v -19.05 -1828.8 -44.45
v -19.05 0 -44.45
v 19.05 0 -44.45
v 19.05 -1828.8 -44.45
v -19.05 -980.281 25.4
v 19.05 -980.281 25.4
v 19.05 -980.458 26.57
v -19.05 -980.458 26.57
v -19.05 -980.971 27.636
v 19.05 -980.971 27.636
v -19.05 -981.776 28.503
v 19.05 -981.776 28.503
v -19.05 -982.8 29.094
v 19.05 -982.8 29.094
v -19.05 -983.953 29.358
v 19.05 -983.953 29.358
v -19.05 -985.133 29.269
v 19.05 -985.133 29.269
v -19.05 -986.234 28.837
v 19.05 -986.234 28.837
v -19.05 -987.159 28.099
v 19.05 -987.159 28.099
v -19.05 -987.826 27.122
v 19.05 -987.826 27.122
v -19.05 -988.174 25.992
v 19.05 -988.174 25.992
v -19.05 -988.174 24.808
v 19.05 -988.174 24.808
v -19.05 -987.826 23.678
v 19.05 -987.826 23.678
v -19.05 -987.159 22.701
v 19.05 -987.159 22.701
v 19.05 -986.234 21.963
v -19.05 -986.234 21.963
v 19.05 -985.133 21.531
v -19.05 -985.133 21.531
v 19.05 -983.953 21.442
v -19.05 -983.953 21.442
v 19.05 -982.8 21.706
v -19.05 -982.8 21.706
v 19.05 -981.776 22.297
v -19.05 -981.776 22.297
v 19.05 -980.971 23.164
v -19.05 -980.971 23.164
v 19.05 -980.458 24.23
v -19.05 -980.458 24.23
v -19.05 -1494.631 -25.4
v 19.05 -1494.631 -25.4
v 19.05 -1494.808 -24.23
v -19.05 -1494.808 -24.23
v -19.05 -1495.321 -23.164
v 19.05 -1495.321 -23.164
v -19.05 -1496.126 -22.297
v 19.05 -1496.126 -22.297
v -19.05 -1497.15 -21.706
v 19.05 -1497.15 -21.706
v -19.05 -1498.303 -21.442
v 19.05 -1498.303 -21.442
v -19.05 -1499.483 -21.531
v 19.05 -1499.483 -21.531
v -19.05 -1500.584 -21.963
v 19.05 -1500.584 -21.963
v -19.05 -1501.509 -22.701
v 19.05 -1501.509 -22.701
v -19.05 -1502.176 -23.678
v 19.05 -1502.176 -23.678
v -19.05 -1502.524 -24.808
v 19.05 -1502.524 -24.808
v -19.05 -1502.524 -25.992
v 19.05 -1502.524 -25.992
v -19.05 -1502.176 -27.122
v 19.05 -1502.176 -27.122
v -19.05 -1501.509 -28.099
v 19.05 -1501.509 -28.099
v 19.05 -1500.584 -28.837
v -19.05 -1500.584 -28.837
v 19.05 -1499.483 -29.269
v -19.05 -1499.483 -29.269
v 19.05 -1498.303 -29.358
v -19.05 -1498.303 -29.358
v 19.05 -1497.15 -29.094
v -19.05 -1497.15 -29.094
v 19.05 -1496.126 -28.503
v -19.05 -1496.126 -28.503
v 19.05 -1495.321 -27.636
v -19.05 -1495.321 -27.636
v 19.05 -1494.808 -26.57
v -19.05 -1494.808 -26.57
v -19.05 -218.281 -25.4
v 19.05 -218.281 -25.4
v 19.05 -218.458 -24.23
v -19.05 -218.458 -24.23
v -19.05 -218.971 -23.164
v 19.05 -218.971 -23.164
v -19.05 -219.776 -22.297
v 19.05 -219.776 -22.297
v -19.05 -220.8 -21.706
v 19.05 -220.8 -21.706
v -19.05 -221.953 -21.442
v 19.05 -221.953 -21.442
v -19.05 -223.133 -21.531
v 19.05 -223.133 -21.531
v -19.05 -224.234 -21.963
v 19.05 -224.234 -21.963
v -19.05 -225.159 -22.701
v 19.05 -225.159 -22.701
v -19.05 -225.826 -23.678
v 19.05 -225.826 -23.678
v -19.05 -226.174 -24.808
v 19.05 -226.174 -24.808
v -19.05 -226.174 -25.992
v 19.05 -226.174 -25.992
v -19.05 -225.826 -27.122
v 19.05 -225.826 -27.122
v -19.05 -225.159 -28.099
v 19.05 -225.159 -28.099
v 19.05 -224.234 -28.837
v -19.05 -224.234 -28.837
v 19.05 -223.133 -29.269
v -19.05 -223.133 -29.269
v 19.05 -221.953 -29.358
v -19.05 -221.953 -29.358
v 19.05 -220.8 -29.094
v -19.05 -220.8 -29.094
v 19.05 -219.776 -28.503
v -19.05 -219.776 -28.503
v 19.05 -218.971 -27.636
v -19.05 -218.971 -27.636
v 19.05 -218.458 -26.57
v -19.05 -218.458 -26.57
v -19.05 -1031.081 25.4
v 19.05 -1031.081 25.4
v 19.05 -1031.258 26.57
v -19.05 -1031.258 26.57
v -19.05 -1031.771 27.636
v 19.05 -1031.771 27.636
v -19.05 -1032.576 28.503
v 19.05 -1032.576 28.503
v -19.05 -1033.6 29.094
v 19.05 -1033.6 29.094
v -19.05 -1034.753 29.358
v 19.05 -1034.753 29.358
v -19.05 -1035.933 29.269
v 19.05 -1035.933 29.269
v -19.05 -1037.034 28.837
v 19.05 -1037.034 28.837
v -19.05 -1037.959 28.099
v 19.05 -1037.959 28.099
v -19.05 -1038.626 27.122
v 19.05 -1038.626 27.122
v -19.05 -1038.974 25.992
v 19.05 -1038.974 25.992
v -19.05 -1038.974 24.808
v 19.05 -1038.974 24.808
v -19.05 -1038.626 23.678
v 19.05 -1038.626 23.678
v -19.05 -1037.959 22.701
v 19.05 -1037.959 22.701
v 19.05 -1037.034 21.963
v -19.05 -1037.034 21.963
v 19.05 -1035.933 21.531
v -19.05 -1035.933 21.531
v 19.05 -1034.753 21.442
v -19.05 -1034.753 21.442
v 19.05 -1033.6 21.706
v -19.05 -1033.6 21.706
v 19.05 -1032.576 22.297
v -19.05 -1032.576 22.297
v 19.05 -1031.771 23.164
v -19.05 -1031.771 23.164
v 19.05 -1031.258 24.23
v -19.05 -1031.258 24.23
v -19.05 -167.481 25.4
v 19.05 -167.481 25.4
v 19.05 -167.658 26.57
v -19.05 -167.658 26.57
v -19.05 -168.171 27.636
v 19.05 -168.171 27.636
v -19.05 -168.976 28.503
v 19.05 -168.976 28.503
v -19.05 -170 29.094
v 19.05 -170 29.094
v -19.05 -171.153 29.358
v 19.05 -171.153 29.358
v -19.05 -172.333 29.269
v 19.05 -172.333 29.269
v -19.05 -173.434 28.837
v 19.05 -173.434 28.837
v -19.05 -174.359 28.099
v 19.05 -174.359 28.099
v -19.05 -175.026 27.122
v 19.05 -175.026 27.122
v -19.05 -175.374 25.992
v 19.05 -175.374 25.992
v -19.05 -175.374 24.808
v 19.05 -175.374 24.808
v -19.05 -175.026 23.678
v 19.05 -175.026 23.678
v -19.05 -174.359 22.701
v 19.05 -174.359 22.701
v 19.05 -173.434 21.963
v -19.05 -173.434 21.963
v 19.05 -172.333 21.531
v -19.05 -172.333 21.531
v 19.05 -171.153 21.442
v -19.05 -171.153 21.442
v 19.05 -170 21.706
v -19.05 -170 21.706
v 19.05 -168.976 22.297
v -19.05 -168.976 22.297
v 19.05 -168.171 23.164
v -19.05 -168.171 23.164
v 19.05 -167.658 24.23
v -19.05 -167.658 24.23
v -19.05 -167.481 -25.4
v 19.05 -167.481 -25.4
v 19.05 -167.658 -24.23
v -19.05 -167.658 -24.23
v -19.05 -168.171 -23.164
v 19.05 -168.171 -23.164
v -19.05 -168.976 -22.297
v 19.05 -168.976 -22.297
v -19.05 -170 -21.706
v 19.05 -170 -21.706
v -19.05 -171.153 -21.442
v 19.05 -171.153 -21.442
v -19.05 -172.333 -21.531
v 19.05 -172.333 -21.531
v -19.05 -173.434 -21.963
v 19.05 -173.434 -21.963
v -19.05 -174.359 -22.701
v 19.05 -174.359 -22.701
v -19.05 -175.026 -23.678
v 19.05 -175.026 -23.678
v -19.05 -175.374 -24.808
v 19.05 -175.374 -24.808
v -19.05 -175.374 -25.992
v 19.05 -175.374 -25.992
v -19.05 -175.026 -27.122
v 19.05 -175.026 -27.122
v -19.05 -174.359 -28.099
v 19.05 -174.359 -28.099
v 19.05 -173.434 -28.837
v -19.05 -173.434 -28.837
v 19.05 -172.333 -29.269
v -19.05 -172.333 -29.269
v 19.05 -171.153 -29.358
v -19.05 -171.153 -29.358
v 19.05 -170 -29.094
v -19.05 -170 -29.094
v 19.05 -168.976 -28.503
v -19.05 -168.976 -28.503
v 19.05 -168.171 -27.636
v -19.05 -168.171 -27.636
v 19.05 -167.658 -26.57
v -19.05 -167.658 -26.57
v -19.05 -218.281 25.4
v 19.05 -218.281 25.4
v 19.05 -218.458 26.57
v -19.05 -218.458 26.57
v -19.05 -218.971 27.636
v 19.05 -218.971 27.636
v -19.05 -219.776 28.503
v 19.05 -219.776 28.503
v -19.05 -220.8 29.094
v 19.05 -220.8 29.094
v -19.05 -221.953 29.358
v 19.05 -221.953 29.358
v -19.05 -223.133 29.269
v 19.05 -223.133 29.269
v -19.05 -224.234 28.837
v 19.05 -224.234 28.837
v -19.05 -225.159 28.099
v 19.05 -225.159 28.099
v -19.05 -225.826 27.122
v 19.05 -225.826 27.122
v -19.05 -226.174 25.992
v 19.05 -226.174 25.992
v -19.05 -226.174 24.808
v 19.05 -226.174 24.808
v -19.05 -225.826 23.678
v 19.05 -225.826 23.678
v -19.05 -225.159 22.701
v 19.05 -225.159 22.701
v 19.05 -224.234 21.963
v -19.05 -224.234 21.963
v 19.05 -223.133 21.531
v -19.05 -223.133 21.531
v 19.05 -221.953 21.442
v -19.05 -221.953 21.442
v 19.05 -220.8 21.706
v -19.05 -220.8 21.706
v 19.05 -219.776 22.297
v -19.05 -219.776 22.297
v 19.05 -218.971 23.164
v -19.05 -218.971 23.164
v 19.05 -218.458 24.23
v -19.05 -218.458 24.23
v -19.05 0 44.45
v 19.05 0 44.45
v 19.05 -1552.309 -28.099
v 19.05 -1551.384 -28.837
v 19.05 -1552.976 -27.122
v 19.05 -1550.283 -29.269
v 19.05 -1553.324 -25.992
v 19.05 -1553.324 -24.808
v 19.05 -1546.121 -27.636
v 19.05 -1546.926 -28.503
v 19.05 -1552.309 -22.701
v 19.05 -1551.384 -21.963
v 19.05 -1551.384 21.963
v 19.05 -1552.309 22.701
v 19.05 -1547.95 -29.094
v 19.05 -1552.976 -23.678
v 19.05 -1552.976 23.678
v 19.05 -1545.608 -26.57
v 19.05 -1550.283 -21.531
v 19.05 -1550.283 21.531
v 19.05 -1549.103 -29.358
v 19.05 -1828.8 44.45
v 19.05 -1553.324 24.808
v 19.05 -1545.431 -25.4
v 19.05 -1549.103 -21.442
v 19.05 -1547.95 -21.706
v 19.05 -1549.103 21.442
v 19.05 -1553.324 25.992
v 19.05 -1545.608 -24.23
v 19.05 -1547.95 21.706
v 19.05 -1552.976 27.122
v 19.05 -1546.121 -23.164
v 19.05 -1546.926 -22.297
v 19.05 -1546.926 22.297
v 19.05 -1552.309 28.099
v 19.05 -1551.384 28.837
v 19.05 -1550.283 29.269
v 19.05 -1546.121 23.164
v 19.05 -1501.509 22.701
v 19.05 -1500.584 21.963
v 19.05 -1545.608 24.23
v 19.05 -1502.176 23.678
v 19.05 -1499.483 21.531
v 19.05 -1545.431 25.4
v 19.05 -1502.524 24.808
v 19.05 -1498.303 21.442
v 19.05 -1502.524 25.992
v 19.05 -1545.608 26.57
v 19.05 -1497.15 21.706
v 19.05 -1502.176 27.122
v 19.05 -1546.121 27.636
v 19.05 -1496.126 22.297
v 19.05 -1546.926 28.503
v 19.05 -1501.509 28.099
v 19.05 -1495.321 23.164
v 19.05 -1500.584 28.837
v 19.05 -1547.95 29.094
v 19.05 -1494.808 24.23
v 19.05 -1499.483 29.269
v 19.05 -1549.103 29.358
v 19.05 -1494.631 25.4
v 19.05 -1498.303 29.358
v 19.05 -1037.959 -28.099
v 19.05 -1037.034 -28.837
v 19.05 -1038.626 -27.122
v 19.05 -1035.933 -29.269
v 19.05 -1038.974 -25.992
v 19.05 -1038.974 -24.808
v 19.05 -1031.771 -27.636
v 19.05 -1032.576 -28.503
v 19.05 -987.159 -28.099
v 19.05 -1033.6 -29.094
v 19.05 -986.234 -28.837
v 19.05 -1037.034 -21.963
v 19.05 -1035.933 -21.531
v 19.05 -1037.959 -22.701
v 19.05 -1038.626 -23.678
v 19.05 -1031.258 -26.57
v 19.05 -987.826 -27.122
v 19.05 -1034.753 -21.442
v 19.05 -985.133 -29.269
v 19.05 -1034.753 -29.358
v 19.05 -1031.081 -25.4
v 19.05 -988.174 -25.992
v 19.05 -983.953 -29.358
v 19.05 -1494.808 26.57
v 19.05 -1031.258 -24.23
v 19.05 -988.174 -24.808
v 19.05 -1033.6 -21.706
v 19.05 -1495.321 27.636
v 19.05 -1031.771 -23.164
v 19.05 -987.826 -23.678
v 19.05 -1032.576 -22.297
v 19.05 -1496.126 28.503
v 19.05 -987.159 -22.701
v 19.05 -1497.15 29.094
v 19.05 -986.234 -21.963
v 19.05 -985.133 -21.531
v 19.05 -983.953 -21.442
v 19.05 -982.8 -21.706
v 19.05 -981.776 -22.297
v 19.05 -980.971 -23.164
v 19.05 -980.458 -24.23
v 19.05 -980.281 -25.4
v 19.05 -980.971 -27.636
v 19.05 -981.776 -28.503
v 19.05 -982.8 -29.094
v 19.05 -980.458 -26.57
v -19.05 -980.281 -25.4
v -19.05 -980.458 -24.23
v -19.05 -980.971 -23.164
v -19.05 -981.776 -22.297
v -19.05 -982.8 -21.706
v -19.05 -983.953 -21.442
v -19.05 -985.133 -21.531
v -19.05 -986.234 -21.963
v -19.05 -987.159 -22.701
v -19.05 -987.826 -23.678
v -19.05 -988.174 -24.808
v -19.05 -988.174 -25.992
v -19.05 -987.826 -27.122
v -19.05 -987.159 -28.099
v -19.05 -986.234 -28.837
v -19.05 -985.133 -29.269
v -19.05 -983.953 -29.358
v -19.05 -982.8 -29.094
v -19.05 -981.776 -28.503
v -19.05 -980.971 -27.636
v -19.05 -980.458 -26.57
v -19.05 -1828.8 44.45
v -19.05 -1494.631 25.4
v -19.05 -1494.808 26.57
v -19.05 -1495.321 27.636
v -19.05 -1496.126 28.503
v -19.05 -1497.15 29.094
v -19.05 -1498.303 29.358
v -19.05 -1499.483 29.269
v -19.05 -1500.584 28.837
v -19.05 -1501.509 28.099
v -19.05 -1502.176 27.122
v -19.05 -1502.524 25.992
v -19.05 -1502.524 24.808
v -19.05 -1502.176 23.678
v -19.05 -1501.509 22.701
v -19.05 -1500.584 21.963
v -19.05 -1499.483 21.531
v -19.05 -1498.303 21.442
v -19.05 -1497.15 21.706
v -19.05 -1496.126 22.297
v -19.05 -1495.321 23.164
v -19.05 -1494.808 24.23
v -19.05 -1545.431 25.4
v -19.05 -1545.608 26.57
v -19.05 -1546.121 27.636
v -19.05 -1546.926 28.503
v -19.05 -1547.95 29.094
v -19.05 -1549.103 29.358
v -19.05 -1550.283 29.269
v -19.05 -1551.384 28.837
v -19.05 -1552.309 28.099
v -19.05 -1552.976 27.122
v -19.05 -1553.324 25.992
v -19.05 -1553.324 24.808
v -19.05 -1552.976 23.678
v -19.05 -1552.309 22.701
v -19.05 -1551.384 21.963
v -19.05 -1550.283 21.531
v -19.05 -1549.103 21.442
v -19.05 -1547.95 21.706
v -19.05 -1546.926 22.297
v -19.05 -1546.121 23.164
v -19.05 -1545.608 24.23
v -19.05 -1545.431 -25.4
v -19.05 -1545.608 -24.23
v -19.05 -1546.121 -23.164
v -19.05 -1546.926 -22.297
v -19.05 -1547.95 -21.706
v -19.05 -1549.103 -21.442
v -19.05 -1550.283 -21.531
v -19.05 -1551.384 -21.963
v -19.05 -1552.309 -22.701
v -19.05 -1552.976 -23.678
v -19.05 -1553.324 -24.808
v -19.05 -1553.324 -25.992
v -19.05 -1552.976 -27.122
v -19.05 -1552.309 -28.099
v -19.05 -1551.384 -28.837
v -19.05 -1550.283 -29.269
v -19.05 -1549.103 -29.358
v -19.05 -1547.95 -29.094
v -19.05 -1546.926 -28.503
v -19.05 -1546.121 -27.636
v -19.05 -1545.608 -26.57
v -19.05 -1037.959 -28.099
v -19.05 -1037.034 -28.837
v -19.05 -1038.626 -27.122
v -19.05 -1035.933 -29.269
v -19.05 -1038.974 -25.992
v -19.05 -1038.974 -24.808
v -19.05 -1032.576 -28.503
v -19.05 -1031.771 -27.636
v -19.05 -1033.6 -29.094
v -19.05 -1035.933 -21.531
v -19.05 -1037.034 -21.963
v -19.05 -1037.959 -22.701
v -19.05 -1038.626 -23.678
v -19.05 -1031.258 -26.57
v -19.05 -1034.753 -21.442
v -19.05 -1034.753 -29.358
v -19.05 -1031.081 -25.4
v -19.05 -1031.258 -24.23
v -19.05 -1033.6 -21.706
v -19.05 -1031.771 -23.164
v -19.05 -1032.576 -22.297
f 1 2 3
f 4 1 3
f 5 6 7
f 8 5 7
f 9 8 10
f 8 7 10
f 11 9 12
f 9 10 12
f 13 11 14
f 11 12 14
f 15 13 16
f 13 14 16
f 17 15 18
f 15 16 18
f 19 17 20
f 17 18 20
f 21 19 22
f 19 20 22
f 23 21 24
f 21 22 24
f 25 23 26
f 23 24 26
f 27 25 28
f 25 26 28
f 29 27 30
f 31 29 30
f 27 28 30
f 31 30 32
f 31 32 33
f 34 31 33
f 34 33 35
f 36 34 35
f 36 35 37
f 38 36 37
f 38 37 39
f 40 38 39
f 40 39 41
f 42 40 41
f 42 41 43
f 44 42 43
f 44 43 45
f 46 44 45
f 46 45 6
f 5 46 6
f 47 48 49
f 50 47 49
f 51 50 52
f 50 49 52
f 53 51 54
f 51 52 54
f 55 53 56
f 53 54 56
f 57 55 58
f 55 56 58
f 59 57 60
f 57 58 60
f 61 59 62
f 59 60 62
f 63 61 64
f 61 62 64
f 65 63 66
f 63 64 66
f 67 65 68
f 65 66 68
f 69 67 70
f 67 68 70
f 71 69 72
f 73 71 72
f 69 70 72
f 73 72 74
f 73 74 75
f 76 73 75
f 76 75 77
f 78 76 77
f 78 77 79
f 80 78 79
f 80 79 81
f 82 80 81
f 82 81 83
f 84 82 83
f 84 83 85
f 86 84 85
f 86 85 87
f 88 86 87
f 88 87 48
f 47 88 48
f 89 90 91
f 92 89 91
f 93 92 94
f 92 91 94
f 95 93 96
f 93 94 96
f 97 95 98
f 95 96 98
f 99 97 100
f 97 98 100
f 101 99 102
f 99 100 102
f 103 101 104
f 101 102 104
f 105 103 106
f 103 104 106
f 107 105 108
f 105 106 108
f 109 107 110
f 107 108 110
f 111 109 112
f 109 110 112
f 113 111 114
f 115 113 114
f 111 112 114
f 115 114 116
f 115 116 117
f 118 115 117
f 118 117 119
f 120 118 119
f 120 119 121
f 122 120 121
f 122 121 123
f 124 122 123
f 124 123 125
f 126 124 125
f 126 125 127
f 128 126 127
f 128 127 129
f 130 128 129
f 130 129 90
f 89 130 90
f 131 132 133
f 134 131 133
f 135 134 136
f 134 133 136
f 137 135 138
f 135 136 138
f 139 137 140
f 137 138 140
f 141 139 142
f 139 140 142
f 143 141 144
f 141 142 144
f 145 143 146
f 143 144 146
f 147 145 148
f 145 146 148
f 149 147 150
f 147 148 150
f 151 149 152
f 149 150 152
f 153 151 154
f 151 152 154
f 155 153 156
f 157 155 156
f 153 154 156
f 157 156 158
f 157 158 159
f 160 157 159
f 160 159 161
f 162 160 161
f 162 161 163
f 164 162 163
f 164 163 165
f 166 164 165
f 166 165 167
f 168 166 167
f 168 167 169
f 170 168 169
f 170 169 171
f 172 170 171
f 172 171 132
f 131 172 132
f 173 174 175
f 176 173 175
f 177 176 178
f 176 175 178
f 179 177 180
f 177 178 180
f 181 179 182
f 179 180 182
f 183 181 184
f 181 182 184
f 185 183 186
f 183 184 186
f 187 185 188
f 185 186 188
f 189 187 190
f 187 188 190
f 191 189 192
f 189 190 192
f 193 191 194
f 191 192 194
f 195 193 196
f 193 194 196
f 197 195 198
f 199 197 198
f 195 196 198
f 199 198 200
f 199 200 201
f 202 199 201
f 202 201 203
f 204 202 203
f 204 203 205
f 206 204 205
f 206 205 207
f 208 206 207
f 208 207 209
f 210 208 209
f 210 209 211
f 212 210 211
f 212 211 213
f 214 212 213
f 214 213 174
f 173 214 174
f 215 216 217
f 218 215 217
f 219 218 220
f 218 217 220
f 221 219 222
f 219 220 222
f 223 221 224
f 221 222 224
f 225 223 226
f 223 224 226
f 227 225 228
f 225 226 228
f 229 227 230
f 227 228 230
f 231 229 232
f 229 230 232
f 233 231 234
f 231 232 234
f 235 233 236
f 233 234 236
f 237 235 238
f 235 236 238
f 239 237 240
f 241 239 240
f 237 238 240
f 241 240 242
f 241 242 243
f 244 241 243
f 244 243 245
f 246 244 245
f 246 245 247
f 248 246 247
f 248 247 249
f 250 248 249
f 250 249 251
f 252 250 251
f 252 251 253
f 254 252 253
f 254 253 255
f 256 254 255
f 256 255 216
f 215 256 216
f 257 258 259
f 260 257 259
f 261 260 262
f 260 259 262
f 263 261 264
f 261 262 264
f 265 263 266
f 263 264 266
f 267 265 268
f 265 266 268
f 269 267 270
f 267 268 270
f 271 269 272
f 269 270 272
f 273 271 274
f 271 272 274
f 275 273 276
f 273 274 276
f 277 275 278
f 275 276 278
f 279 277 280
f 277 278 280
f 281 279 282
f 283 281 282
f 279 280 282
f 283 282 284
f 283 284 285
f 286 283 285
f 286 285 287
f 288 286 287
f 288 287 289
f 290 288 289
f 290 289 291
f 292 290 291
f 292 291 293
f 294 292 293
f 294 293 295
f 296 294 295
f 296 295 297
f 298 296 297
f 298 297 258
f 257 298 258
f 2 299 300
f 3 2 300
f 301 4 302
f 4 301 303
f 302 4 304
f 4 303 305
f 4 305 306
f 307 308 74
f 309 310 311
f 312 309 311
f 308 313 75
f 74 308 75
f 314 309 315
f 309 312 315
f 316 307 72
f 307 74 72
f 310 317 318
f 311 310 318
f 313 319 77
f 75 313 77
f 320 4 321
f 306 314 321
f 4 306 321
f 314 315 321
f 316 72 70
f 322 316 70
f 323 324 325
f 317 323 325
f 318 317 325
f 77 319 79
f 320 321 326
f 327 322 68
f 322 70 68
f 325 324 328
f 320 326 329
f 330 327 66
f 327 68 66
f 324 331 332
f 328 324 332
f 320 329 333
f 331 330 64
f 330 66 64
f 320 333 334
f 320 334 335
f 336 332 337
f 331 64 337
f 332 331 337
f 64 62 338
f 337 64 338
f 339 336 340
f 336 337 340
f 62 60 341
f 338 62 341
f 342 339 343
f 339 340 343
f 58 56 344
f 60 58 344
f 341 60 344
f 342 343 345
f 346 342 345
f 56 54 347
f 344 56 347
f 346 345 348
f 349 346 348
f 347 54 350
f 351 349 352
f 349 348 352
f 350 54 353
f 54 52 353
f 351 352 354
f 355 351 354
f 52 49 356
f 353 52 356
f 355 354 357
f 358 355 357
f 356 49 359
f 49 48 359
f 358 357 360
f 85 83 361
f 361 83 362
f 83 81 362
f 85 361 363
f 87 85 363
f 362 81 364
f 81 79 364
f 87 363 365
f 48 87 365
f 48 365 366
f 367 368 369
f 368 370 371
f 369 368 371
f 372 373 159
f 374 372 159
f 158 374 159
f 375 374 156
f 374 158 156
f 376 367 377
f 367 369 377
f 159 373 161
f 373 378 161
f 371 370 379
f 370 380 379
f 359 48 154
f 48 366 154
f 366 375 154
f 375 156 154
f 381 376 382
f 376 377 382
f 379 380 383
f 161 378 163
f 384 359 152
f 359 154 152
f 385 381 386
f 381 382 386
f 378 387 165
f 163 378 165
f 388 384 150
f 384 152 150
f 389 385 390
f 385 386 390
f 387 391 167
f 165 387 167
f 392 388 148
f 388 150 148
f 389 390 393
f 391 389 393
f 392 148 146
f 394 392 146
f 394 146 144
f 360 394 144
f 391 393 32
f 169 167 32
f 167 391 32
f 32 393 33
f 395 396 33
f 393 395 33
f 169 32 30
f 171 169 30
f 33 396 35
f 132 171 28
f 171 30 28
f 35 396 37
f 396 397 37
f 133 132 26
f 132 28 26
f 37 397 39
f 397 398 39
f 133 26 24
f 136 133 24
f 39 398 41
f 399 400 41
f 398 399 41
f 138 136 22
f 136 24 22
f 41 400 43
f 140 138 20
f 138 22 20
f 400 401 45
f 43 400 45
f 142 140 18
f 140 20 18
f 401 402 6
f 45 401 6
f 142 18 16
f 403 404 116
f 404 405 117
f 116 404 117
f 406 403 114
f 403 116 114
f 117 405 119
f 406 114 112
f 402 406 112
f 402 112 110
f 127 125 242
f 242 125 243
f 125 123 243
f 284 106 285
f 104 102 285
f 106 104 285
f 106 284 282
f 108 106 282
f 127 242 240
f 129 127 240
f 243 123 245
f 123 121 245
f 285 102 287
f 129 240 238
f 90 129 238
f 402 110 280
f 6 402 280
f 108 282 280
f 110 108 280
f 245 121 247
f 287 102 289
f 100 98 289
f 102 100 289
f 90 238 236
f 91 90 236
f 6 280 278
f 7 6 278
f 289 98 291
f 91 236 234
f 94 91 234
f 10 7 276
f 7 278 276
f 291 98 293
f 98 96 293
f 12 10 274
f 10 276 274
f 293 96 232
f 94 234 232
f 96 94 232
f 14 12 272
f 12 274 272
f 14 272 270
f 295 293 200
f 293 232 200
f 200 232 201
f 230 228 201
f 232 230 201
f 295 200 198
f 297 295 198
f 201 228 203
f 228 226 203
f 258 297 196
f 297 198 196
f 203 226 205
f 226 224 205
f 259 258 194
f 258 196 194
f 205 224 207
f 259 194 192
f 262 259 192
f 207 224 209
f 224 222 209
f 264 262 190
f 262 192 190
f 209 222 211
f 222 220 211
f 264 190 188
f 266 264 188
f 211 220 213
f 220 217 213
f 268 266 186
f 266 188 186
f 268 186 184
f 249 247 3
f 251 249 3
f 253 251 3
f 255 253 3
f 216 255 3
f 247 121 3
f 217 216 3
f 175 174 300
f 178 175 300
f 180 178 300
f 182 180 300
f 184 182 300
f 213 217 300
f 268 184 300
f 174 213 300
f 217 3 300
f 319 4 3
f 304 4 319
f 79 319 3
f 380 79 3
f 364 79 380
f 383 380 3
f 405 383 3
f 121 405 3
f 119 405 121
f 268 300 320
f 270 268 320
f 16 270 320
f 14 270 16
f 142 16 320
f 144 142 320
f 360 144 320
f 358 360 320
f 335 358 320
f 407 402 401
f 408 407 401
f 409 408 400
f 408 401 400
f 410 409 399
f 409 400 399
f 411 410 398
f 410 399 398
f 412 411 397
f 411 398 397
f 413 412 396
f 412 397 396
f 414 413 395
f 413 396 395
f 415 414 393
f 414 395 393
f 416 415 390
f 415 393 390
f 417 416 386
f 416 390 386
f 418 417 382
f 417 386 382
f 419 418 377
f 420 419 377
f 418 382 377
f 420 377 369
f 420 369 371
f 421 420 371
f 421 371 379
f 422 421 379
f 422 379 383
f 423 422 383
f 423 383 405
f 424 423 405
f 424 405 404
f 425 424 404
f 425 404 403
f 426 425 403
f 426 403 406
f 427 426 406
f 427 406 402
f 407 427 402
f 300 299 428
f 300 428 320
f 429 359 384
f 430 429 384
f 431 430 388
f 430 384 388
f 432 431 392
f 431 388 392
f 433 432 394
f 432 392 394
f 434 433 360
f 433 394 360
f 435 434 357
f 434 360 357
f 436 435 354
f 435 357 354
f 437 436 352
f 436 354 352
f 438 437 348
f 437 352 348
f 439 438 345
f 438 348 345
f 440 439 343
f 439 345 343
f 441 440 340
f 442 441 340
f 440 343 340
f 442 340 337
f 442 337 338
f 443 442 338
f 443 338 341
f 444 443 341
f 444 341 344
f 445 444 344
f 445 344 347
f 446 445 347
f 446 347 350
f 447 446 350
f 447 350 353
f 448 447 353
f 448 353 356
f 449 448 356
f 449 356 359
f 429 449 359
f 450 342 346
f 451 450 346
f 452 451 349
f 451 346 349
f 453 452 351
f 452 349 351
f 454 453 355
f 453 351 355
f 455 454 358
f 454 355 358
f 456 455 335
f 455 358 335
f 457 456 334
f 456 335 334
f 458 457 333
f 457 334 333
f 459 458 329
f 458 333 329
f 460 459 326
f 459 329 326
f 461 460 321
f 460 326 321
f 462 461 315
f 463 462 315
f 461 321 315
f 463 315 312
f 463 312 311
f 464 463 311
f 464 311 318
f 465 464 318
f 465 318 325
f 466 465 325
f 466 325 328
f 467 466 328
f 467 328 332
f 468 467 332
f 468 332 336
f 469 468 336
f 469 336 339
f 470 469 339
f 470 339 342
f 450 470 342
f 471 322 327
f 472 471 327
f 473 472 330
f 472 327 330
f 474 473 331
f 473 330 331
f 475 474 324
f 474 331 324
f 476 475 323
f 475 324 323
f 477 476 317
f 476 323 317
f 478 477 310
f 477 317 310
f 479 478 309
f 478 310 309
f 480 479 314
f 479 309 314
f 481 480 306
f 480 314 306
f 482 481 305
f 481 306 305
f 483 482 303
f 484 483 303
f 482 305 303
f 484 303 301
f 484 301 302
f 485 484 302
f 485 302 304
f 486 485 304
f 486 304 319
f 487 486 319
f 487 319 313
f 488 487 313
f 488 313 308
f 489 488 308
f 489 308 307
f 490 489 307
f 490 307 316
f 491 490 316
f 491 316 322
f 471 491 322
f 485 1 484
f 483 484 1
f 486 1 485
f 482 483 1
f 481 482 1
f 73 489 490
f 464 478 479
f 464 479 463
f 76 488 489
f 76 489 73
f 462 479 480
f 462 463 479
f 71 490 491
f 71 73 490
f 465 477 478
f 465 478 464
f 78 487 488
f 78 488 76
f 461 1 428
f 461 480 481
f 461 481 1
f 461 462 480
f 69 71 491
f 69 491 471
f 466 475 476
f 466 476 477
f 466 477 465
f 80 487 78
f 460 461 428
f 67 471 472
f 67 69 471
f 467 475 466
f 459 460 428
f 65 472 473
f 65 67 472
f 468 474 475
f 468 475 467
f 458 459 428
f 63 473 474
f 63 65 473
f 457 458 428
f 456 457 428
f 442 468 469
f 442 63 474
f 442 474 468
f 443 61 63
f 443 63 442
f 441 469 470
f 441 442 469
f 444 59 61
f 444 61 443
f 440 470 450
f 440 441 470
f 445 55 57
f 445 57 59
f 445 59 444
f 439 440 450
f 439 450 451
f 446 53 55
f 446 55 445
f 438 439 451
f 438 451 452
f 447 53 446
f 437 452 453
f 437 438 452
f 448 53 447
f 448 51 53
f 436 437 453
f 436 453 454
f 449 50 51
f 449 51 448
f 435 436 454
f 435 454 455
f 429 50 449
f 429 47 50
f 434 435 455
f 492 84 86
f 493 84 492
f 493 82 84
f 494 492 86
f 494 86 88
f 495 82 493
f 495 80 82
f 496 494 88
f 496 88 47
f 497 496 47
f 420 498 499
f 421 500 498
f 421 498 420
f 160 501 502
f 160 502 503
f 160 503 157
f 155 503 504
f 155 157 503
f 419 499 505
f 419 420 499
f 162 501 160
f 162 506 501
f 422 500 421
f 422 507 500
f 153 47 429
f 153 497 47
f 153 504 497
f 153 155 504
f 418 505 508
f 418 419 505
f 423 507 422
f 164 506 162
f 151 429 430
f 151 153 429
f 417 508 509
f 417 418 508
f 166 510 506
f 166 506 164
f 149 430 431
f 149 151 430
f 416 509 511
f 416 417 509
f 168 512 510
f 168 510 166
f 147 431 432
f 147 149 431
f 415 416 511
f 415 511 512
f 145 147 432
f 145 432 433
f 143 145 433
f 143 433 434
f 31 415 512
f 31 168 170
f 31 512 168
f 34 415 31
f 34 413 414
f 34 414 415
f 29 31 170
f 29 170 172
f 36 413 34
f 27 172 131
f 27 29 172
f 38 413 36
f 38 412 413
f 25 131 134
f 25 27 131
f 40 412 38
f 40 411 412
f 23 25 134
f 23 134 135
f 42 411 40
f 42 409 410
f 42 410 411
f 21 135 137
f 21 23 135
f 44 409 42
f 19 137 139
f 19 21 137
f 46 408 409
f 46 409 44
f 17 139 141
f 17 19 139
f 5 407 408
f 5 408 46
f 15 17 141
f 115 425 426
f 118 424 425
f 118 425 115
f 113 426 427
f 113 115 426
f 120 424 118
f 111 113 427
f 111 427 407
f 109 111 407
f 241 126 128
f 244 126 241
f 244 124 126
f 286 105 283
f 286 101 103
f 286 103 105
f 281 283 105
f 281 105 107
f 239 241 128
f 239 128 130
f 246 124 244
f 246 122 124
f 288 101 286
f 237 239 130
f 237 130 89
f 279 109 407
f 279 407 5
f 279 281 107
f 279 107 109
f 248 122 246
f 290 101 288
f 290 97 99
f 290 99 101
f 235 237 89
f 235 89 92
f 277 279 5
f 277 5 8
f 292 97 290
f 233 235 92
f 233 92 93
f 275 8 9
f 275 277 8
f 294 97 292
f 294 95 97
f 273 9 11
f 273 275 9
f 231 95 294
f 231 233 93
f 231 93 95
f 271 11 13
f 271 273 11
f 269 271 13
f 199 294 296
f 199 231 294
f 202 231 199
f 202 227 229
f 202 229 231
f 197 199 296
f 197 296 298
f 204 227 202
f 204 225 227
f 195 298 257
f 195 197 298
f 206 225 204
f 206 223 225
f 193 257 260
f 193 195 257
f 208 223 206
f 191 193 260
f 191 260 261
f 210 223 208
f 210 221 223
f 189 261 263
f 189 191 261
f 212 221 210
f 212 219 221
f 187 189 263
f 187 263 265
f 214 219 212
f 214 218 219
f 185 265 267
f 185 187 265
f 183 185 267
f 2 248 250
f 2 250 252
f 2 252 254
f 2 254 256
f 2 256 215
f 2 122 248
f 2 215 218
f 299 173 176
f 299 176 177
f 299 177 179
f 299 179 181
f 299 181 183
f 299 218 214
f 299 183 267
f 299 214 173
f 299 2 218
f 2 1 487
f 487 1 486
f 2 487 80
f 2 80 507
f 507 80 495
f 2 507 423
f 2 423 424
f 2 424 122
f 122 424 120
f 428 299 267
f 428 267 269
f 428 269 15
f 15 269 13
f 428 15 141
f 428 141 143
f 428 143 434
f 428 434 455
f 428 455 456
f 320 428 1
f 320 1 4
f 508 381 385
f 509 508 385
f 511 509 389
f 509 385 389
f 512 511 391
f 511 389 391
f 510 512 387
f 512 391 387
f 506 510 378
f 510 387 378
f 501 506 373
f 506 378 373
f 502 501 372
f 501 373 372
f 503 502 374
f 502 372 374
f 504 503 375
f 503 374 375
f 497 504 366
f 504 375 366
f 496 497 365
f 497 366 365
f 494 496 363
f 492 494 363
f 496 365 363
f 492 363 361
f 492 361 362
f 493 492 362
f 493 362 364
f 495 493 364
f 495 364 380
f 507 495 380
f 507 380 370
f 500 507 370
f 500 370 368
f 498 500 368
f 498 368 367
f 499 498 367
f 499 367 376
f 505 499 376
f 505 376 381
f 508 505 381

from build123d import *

# Parameters (mm, degrees)
F0_W     = 38.1
F0_H     = 88.9
F1_DEPTH = 1828.8
F2_R     = 3.96875
F3_DEPTH = 38.101


with BuildPart() as f1:
    # F0 (on Front) → F1 (new body)
    with BuildSketch(Plane.XZ):
        Rectangle(F0_W, F0_H)
    extrude(amount=F1_DEPTH)

    # F2 (on face) → F3 (cut, through all)
    with BuildSketch(Plane.YZ.offset(19.05)):
        with Locations((-1498.6, 25.4)):
            Circle(F2_R)
        with Locations((-1498.6, -25.4)):
            Circle(F2_R)
        with Locations((-1549.4, -25.4)):
            Circle(F2_R)
        with Locations((-1549.4, 25.4)):
            Circle(F2_R)
        with Locations((-1035.05, 25.4)):
            Circle(F2_R)
        with Locations((-1035.05, -25.4)):
            Circle(F2_R)
        with Locations((-984.25, -25.4)):
            Circle(F2_R)
        with Locations((-984.25, 25.4)):
            Circle(F2_R)
        with Locations((-222.25, 25.4)):
            Circle(F2_R)
        with Locations((-171.45, 25.4)):
            Circle(F2_R)
        with Locations((-171.45, -25.4)):
            Circle(F2_R)
        with Locations((-222.25, -25.4)):
            Circle(F2_R)
    extrude(amount=-F3_DEPTH, mode=Mode.SUBTRACT)


solid = f1.part
